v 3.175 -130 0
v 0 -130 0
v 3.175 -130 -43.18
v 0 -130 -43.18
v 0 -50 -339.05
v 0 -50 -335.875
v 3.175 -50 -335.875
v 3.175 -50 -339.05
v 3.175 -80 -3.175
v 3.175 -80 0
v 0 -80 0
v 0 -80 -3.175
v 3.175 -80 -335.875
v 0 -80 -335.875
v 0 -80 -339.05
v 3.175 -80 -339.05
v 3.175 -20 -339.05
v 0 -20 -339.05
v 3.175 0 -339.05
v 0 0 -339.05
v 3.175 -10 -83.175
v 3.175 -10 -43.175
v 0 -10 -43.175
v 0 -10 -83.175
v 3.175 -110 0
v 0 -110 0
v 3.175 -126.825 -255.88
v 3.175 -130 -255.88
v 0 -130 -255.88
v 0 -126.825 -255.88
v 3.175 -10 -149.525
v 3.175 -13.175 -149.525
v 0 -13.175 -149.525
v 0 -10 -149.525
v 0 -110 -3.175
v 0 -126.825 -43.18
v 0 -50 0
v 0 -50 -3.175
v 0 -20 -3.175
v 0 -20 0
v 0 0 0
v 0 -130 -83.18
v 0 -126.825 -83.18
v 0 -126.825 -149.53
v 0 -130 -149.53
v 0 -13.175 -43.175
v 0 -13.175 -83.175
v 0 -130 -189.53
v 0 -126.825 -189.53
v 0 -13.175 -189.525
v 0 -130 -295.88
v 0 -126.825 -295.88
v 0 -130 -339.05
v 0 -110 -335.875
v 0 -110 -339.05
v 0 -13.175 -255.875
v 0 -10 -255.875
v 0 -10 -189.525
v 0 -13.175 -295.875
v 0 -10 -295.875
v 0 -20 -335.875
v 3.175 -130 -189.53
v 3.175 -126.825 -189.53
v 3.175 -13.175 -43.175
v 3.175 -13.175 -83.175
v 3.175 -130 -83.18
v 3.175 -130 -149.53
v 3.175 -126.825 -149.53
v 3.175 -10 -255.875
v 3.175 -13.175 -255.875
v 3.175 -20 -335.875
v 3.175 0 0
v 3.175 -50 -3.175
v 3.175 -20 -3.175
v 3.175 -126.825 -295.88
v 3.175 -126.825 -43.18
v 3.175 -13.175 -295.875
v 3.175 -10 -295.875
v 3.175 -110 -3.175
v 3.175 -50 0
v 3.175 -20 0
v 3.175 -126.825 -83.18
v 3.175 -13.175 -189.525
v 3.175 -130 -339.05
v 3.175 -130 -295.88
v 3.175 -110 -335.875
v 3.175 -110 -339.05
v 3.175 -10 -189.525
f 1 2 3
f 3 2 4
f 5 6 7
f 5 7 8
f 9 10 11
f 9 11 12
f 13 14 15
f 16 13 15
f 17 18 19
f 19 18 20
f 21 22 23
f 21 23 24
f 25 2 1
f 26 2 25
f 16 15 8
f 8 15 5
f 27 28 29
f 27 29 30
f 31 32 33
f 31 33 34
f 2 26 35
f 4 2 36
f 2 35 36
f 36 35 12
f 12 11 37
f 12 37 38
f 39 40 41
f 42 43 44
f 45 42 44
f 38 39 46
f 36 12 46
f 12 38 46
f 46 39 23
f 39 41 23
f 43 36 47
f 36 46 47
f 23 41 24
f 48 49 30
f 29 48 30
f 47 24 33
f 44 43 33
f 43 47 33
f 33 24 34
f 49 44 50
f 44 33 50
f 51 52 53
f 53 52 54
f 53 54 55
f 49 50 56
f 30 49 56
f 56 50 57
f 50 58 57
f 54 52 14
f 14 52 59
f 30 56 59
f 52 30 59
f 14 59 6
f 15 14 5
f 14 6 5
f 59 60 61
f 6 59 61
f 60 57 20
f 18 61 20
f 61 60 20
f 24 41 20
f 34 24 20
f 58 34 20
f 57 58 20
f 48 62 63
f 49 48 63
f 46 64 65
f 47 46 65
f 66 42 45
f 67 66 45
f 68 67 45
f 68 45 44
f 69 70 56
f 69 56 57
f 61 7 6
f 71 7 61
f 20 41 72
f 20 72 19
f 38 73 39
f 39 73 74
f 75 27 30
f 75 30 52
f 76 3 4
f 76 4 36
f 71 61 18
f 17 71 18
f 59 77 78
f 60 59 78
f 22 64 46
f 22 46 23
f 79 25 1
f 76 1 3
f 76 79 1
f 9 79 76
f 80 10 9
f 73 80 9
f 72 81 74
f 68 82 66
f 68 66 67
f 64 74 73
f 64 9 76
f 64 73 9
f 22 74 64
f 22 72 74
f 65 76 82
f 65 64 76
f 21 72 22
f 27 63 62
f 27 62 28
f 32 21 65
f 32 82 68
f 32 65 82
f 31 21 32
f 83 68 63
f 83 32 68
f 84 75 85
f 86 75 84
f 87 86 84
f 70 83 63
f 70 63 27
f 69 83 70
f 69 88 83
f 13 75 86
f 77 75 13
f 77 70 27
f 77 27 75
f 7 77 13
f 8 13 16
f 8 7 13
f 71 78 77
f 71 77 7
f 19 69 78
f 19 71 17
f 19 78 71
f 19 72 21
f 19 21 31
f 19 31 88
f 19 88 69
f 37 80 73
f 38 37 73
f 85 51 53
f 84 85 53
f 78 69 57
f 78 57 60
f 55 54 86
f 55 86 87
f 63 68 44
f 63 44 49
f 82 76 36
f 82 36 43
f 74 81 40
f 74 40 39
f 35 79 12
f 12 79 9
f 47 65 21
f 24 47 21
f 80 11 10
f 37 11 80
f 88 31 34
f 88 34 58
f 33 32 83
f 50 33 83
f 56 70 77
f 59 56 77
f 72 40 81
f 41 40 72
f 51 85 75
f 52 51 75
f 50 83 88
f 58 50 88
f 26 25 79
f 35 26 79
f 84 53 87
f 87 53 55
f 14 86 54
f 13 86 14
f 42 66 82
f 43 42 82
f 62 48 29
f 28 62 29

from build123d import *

# Parameters (mm, degrees)
SKETCH1_W           = 339.05
SKETCH1_H           = 130
BOSS_EXTRUDE1_DEPTH = 3.175
SKETCH2_W           = 40
SKETCH2_H           = 3.175
SKETCH2_W_2         = 3.175
SKETCH2_H_2         = 30
CUT_EXTRUDE1_DEPTH  = 10
SKETCH3_W           = 40
SKETCH3_H           = 3.175
CUT_EXTRUDE2_DEPTH  = 364.132184094
LPATTERN1_COUNT     = 3
LPATTERN1_PITCH     = 106.35


with BuildPart() as part:
    # Sketch1 → Boss-Extrude1 (new body)
    with BuildSketch(Plane(origin=(0, 0, 0), x_dir=(0, 0, -1), z_dir=(1, 0, 0))):
        with Locations((169.525, -65)):
            Rectangle(SKETCH1_W, SKETCH1_H)
    extrude(amount=BOSS_EXTRUDE1_DEPTH)

    # Sketch2 → Cut-Extrude1 (cut)
    with BuildSketch(Plane(origin=(3.175, 0, 0), x_dir=(0, 0, -1), z_dir=(1, 0, 0))):
        with Locations((63.175, -11.5875)):
            Rectangle(SKETCH2_W, SKETCH2_H)
        with Locations((169.525, -11.5875)):
            Rectangle(SKETCH2_W, SKETCH2_H)
        with Locations((275.875, -11.5875)):
            Rectangle(SKETCH2_W, SKETCH2_H)
        with Locations((337.4625, -35)):
            Rectangle(SKETCH2_W_2, SKETCH2_H_2)
        with Locations((337.4625, -95)):
            Rectangle(SKETCH2_W_2, SKETCH2_H_2)
        with Locations((1.5875, -35)):
            Rectangle(SKETCH2_W_2, SKETCH2_H_2)
        with Locations((1.5875, -95)):
            Rectangle(SKETCH2_W_2, SKETCH2_H_2)
    extrude(amount=-CUT_EXTRUDE1_DEPTH, mode=Mode.SUBTRACT)

    # Sketch3 → Cut-Extrude2 (cut, through all)
    with BuildSketch(Plane(origin=(3.175, 0, 0), x_dir=(0, 0, -1), z_dir=(1, 0, 0))):
        with Locations((63.18, -128.4125)):
            Rectangle(SKETCH3_W, SKETCH3_H)
    cut_extrude2 = extrude(amount=-CUT_EXTRUDE2_DEPTH, mode=Mode.SUBTRACT)

    # LPattern1: Cut-Extrude2 ×3
    with Locations(*[(0, 0, -i * LPATTERN1_PITCH) for i in range(1, LPATTERN1_COUNT)]):
        add(cut_extrude2, mode=Mode.SUBTRACT)


solid = part.part
